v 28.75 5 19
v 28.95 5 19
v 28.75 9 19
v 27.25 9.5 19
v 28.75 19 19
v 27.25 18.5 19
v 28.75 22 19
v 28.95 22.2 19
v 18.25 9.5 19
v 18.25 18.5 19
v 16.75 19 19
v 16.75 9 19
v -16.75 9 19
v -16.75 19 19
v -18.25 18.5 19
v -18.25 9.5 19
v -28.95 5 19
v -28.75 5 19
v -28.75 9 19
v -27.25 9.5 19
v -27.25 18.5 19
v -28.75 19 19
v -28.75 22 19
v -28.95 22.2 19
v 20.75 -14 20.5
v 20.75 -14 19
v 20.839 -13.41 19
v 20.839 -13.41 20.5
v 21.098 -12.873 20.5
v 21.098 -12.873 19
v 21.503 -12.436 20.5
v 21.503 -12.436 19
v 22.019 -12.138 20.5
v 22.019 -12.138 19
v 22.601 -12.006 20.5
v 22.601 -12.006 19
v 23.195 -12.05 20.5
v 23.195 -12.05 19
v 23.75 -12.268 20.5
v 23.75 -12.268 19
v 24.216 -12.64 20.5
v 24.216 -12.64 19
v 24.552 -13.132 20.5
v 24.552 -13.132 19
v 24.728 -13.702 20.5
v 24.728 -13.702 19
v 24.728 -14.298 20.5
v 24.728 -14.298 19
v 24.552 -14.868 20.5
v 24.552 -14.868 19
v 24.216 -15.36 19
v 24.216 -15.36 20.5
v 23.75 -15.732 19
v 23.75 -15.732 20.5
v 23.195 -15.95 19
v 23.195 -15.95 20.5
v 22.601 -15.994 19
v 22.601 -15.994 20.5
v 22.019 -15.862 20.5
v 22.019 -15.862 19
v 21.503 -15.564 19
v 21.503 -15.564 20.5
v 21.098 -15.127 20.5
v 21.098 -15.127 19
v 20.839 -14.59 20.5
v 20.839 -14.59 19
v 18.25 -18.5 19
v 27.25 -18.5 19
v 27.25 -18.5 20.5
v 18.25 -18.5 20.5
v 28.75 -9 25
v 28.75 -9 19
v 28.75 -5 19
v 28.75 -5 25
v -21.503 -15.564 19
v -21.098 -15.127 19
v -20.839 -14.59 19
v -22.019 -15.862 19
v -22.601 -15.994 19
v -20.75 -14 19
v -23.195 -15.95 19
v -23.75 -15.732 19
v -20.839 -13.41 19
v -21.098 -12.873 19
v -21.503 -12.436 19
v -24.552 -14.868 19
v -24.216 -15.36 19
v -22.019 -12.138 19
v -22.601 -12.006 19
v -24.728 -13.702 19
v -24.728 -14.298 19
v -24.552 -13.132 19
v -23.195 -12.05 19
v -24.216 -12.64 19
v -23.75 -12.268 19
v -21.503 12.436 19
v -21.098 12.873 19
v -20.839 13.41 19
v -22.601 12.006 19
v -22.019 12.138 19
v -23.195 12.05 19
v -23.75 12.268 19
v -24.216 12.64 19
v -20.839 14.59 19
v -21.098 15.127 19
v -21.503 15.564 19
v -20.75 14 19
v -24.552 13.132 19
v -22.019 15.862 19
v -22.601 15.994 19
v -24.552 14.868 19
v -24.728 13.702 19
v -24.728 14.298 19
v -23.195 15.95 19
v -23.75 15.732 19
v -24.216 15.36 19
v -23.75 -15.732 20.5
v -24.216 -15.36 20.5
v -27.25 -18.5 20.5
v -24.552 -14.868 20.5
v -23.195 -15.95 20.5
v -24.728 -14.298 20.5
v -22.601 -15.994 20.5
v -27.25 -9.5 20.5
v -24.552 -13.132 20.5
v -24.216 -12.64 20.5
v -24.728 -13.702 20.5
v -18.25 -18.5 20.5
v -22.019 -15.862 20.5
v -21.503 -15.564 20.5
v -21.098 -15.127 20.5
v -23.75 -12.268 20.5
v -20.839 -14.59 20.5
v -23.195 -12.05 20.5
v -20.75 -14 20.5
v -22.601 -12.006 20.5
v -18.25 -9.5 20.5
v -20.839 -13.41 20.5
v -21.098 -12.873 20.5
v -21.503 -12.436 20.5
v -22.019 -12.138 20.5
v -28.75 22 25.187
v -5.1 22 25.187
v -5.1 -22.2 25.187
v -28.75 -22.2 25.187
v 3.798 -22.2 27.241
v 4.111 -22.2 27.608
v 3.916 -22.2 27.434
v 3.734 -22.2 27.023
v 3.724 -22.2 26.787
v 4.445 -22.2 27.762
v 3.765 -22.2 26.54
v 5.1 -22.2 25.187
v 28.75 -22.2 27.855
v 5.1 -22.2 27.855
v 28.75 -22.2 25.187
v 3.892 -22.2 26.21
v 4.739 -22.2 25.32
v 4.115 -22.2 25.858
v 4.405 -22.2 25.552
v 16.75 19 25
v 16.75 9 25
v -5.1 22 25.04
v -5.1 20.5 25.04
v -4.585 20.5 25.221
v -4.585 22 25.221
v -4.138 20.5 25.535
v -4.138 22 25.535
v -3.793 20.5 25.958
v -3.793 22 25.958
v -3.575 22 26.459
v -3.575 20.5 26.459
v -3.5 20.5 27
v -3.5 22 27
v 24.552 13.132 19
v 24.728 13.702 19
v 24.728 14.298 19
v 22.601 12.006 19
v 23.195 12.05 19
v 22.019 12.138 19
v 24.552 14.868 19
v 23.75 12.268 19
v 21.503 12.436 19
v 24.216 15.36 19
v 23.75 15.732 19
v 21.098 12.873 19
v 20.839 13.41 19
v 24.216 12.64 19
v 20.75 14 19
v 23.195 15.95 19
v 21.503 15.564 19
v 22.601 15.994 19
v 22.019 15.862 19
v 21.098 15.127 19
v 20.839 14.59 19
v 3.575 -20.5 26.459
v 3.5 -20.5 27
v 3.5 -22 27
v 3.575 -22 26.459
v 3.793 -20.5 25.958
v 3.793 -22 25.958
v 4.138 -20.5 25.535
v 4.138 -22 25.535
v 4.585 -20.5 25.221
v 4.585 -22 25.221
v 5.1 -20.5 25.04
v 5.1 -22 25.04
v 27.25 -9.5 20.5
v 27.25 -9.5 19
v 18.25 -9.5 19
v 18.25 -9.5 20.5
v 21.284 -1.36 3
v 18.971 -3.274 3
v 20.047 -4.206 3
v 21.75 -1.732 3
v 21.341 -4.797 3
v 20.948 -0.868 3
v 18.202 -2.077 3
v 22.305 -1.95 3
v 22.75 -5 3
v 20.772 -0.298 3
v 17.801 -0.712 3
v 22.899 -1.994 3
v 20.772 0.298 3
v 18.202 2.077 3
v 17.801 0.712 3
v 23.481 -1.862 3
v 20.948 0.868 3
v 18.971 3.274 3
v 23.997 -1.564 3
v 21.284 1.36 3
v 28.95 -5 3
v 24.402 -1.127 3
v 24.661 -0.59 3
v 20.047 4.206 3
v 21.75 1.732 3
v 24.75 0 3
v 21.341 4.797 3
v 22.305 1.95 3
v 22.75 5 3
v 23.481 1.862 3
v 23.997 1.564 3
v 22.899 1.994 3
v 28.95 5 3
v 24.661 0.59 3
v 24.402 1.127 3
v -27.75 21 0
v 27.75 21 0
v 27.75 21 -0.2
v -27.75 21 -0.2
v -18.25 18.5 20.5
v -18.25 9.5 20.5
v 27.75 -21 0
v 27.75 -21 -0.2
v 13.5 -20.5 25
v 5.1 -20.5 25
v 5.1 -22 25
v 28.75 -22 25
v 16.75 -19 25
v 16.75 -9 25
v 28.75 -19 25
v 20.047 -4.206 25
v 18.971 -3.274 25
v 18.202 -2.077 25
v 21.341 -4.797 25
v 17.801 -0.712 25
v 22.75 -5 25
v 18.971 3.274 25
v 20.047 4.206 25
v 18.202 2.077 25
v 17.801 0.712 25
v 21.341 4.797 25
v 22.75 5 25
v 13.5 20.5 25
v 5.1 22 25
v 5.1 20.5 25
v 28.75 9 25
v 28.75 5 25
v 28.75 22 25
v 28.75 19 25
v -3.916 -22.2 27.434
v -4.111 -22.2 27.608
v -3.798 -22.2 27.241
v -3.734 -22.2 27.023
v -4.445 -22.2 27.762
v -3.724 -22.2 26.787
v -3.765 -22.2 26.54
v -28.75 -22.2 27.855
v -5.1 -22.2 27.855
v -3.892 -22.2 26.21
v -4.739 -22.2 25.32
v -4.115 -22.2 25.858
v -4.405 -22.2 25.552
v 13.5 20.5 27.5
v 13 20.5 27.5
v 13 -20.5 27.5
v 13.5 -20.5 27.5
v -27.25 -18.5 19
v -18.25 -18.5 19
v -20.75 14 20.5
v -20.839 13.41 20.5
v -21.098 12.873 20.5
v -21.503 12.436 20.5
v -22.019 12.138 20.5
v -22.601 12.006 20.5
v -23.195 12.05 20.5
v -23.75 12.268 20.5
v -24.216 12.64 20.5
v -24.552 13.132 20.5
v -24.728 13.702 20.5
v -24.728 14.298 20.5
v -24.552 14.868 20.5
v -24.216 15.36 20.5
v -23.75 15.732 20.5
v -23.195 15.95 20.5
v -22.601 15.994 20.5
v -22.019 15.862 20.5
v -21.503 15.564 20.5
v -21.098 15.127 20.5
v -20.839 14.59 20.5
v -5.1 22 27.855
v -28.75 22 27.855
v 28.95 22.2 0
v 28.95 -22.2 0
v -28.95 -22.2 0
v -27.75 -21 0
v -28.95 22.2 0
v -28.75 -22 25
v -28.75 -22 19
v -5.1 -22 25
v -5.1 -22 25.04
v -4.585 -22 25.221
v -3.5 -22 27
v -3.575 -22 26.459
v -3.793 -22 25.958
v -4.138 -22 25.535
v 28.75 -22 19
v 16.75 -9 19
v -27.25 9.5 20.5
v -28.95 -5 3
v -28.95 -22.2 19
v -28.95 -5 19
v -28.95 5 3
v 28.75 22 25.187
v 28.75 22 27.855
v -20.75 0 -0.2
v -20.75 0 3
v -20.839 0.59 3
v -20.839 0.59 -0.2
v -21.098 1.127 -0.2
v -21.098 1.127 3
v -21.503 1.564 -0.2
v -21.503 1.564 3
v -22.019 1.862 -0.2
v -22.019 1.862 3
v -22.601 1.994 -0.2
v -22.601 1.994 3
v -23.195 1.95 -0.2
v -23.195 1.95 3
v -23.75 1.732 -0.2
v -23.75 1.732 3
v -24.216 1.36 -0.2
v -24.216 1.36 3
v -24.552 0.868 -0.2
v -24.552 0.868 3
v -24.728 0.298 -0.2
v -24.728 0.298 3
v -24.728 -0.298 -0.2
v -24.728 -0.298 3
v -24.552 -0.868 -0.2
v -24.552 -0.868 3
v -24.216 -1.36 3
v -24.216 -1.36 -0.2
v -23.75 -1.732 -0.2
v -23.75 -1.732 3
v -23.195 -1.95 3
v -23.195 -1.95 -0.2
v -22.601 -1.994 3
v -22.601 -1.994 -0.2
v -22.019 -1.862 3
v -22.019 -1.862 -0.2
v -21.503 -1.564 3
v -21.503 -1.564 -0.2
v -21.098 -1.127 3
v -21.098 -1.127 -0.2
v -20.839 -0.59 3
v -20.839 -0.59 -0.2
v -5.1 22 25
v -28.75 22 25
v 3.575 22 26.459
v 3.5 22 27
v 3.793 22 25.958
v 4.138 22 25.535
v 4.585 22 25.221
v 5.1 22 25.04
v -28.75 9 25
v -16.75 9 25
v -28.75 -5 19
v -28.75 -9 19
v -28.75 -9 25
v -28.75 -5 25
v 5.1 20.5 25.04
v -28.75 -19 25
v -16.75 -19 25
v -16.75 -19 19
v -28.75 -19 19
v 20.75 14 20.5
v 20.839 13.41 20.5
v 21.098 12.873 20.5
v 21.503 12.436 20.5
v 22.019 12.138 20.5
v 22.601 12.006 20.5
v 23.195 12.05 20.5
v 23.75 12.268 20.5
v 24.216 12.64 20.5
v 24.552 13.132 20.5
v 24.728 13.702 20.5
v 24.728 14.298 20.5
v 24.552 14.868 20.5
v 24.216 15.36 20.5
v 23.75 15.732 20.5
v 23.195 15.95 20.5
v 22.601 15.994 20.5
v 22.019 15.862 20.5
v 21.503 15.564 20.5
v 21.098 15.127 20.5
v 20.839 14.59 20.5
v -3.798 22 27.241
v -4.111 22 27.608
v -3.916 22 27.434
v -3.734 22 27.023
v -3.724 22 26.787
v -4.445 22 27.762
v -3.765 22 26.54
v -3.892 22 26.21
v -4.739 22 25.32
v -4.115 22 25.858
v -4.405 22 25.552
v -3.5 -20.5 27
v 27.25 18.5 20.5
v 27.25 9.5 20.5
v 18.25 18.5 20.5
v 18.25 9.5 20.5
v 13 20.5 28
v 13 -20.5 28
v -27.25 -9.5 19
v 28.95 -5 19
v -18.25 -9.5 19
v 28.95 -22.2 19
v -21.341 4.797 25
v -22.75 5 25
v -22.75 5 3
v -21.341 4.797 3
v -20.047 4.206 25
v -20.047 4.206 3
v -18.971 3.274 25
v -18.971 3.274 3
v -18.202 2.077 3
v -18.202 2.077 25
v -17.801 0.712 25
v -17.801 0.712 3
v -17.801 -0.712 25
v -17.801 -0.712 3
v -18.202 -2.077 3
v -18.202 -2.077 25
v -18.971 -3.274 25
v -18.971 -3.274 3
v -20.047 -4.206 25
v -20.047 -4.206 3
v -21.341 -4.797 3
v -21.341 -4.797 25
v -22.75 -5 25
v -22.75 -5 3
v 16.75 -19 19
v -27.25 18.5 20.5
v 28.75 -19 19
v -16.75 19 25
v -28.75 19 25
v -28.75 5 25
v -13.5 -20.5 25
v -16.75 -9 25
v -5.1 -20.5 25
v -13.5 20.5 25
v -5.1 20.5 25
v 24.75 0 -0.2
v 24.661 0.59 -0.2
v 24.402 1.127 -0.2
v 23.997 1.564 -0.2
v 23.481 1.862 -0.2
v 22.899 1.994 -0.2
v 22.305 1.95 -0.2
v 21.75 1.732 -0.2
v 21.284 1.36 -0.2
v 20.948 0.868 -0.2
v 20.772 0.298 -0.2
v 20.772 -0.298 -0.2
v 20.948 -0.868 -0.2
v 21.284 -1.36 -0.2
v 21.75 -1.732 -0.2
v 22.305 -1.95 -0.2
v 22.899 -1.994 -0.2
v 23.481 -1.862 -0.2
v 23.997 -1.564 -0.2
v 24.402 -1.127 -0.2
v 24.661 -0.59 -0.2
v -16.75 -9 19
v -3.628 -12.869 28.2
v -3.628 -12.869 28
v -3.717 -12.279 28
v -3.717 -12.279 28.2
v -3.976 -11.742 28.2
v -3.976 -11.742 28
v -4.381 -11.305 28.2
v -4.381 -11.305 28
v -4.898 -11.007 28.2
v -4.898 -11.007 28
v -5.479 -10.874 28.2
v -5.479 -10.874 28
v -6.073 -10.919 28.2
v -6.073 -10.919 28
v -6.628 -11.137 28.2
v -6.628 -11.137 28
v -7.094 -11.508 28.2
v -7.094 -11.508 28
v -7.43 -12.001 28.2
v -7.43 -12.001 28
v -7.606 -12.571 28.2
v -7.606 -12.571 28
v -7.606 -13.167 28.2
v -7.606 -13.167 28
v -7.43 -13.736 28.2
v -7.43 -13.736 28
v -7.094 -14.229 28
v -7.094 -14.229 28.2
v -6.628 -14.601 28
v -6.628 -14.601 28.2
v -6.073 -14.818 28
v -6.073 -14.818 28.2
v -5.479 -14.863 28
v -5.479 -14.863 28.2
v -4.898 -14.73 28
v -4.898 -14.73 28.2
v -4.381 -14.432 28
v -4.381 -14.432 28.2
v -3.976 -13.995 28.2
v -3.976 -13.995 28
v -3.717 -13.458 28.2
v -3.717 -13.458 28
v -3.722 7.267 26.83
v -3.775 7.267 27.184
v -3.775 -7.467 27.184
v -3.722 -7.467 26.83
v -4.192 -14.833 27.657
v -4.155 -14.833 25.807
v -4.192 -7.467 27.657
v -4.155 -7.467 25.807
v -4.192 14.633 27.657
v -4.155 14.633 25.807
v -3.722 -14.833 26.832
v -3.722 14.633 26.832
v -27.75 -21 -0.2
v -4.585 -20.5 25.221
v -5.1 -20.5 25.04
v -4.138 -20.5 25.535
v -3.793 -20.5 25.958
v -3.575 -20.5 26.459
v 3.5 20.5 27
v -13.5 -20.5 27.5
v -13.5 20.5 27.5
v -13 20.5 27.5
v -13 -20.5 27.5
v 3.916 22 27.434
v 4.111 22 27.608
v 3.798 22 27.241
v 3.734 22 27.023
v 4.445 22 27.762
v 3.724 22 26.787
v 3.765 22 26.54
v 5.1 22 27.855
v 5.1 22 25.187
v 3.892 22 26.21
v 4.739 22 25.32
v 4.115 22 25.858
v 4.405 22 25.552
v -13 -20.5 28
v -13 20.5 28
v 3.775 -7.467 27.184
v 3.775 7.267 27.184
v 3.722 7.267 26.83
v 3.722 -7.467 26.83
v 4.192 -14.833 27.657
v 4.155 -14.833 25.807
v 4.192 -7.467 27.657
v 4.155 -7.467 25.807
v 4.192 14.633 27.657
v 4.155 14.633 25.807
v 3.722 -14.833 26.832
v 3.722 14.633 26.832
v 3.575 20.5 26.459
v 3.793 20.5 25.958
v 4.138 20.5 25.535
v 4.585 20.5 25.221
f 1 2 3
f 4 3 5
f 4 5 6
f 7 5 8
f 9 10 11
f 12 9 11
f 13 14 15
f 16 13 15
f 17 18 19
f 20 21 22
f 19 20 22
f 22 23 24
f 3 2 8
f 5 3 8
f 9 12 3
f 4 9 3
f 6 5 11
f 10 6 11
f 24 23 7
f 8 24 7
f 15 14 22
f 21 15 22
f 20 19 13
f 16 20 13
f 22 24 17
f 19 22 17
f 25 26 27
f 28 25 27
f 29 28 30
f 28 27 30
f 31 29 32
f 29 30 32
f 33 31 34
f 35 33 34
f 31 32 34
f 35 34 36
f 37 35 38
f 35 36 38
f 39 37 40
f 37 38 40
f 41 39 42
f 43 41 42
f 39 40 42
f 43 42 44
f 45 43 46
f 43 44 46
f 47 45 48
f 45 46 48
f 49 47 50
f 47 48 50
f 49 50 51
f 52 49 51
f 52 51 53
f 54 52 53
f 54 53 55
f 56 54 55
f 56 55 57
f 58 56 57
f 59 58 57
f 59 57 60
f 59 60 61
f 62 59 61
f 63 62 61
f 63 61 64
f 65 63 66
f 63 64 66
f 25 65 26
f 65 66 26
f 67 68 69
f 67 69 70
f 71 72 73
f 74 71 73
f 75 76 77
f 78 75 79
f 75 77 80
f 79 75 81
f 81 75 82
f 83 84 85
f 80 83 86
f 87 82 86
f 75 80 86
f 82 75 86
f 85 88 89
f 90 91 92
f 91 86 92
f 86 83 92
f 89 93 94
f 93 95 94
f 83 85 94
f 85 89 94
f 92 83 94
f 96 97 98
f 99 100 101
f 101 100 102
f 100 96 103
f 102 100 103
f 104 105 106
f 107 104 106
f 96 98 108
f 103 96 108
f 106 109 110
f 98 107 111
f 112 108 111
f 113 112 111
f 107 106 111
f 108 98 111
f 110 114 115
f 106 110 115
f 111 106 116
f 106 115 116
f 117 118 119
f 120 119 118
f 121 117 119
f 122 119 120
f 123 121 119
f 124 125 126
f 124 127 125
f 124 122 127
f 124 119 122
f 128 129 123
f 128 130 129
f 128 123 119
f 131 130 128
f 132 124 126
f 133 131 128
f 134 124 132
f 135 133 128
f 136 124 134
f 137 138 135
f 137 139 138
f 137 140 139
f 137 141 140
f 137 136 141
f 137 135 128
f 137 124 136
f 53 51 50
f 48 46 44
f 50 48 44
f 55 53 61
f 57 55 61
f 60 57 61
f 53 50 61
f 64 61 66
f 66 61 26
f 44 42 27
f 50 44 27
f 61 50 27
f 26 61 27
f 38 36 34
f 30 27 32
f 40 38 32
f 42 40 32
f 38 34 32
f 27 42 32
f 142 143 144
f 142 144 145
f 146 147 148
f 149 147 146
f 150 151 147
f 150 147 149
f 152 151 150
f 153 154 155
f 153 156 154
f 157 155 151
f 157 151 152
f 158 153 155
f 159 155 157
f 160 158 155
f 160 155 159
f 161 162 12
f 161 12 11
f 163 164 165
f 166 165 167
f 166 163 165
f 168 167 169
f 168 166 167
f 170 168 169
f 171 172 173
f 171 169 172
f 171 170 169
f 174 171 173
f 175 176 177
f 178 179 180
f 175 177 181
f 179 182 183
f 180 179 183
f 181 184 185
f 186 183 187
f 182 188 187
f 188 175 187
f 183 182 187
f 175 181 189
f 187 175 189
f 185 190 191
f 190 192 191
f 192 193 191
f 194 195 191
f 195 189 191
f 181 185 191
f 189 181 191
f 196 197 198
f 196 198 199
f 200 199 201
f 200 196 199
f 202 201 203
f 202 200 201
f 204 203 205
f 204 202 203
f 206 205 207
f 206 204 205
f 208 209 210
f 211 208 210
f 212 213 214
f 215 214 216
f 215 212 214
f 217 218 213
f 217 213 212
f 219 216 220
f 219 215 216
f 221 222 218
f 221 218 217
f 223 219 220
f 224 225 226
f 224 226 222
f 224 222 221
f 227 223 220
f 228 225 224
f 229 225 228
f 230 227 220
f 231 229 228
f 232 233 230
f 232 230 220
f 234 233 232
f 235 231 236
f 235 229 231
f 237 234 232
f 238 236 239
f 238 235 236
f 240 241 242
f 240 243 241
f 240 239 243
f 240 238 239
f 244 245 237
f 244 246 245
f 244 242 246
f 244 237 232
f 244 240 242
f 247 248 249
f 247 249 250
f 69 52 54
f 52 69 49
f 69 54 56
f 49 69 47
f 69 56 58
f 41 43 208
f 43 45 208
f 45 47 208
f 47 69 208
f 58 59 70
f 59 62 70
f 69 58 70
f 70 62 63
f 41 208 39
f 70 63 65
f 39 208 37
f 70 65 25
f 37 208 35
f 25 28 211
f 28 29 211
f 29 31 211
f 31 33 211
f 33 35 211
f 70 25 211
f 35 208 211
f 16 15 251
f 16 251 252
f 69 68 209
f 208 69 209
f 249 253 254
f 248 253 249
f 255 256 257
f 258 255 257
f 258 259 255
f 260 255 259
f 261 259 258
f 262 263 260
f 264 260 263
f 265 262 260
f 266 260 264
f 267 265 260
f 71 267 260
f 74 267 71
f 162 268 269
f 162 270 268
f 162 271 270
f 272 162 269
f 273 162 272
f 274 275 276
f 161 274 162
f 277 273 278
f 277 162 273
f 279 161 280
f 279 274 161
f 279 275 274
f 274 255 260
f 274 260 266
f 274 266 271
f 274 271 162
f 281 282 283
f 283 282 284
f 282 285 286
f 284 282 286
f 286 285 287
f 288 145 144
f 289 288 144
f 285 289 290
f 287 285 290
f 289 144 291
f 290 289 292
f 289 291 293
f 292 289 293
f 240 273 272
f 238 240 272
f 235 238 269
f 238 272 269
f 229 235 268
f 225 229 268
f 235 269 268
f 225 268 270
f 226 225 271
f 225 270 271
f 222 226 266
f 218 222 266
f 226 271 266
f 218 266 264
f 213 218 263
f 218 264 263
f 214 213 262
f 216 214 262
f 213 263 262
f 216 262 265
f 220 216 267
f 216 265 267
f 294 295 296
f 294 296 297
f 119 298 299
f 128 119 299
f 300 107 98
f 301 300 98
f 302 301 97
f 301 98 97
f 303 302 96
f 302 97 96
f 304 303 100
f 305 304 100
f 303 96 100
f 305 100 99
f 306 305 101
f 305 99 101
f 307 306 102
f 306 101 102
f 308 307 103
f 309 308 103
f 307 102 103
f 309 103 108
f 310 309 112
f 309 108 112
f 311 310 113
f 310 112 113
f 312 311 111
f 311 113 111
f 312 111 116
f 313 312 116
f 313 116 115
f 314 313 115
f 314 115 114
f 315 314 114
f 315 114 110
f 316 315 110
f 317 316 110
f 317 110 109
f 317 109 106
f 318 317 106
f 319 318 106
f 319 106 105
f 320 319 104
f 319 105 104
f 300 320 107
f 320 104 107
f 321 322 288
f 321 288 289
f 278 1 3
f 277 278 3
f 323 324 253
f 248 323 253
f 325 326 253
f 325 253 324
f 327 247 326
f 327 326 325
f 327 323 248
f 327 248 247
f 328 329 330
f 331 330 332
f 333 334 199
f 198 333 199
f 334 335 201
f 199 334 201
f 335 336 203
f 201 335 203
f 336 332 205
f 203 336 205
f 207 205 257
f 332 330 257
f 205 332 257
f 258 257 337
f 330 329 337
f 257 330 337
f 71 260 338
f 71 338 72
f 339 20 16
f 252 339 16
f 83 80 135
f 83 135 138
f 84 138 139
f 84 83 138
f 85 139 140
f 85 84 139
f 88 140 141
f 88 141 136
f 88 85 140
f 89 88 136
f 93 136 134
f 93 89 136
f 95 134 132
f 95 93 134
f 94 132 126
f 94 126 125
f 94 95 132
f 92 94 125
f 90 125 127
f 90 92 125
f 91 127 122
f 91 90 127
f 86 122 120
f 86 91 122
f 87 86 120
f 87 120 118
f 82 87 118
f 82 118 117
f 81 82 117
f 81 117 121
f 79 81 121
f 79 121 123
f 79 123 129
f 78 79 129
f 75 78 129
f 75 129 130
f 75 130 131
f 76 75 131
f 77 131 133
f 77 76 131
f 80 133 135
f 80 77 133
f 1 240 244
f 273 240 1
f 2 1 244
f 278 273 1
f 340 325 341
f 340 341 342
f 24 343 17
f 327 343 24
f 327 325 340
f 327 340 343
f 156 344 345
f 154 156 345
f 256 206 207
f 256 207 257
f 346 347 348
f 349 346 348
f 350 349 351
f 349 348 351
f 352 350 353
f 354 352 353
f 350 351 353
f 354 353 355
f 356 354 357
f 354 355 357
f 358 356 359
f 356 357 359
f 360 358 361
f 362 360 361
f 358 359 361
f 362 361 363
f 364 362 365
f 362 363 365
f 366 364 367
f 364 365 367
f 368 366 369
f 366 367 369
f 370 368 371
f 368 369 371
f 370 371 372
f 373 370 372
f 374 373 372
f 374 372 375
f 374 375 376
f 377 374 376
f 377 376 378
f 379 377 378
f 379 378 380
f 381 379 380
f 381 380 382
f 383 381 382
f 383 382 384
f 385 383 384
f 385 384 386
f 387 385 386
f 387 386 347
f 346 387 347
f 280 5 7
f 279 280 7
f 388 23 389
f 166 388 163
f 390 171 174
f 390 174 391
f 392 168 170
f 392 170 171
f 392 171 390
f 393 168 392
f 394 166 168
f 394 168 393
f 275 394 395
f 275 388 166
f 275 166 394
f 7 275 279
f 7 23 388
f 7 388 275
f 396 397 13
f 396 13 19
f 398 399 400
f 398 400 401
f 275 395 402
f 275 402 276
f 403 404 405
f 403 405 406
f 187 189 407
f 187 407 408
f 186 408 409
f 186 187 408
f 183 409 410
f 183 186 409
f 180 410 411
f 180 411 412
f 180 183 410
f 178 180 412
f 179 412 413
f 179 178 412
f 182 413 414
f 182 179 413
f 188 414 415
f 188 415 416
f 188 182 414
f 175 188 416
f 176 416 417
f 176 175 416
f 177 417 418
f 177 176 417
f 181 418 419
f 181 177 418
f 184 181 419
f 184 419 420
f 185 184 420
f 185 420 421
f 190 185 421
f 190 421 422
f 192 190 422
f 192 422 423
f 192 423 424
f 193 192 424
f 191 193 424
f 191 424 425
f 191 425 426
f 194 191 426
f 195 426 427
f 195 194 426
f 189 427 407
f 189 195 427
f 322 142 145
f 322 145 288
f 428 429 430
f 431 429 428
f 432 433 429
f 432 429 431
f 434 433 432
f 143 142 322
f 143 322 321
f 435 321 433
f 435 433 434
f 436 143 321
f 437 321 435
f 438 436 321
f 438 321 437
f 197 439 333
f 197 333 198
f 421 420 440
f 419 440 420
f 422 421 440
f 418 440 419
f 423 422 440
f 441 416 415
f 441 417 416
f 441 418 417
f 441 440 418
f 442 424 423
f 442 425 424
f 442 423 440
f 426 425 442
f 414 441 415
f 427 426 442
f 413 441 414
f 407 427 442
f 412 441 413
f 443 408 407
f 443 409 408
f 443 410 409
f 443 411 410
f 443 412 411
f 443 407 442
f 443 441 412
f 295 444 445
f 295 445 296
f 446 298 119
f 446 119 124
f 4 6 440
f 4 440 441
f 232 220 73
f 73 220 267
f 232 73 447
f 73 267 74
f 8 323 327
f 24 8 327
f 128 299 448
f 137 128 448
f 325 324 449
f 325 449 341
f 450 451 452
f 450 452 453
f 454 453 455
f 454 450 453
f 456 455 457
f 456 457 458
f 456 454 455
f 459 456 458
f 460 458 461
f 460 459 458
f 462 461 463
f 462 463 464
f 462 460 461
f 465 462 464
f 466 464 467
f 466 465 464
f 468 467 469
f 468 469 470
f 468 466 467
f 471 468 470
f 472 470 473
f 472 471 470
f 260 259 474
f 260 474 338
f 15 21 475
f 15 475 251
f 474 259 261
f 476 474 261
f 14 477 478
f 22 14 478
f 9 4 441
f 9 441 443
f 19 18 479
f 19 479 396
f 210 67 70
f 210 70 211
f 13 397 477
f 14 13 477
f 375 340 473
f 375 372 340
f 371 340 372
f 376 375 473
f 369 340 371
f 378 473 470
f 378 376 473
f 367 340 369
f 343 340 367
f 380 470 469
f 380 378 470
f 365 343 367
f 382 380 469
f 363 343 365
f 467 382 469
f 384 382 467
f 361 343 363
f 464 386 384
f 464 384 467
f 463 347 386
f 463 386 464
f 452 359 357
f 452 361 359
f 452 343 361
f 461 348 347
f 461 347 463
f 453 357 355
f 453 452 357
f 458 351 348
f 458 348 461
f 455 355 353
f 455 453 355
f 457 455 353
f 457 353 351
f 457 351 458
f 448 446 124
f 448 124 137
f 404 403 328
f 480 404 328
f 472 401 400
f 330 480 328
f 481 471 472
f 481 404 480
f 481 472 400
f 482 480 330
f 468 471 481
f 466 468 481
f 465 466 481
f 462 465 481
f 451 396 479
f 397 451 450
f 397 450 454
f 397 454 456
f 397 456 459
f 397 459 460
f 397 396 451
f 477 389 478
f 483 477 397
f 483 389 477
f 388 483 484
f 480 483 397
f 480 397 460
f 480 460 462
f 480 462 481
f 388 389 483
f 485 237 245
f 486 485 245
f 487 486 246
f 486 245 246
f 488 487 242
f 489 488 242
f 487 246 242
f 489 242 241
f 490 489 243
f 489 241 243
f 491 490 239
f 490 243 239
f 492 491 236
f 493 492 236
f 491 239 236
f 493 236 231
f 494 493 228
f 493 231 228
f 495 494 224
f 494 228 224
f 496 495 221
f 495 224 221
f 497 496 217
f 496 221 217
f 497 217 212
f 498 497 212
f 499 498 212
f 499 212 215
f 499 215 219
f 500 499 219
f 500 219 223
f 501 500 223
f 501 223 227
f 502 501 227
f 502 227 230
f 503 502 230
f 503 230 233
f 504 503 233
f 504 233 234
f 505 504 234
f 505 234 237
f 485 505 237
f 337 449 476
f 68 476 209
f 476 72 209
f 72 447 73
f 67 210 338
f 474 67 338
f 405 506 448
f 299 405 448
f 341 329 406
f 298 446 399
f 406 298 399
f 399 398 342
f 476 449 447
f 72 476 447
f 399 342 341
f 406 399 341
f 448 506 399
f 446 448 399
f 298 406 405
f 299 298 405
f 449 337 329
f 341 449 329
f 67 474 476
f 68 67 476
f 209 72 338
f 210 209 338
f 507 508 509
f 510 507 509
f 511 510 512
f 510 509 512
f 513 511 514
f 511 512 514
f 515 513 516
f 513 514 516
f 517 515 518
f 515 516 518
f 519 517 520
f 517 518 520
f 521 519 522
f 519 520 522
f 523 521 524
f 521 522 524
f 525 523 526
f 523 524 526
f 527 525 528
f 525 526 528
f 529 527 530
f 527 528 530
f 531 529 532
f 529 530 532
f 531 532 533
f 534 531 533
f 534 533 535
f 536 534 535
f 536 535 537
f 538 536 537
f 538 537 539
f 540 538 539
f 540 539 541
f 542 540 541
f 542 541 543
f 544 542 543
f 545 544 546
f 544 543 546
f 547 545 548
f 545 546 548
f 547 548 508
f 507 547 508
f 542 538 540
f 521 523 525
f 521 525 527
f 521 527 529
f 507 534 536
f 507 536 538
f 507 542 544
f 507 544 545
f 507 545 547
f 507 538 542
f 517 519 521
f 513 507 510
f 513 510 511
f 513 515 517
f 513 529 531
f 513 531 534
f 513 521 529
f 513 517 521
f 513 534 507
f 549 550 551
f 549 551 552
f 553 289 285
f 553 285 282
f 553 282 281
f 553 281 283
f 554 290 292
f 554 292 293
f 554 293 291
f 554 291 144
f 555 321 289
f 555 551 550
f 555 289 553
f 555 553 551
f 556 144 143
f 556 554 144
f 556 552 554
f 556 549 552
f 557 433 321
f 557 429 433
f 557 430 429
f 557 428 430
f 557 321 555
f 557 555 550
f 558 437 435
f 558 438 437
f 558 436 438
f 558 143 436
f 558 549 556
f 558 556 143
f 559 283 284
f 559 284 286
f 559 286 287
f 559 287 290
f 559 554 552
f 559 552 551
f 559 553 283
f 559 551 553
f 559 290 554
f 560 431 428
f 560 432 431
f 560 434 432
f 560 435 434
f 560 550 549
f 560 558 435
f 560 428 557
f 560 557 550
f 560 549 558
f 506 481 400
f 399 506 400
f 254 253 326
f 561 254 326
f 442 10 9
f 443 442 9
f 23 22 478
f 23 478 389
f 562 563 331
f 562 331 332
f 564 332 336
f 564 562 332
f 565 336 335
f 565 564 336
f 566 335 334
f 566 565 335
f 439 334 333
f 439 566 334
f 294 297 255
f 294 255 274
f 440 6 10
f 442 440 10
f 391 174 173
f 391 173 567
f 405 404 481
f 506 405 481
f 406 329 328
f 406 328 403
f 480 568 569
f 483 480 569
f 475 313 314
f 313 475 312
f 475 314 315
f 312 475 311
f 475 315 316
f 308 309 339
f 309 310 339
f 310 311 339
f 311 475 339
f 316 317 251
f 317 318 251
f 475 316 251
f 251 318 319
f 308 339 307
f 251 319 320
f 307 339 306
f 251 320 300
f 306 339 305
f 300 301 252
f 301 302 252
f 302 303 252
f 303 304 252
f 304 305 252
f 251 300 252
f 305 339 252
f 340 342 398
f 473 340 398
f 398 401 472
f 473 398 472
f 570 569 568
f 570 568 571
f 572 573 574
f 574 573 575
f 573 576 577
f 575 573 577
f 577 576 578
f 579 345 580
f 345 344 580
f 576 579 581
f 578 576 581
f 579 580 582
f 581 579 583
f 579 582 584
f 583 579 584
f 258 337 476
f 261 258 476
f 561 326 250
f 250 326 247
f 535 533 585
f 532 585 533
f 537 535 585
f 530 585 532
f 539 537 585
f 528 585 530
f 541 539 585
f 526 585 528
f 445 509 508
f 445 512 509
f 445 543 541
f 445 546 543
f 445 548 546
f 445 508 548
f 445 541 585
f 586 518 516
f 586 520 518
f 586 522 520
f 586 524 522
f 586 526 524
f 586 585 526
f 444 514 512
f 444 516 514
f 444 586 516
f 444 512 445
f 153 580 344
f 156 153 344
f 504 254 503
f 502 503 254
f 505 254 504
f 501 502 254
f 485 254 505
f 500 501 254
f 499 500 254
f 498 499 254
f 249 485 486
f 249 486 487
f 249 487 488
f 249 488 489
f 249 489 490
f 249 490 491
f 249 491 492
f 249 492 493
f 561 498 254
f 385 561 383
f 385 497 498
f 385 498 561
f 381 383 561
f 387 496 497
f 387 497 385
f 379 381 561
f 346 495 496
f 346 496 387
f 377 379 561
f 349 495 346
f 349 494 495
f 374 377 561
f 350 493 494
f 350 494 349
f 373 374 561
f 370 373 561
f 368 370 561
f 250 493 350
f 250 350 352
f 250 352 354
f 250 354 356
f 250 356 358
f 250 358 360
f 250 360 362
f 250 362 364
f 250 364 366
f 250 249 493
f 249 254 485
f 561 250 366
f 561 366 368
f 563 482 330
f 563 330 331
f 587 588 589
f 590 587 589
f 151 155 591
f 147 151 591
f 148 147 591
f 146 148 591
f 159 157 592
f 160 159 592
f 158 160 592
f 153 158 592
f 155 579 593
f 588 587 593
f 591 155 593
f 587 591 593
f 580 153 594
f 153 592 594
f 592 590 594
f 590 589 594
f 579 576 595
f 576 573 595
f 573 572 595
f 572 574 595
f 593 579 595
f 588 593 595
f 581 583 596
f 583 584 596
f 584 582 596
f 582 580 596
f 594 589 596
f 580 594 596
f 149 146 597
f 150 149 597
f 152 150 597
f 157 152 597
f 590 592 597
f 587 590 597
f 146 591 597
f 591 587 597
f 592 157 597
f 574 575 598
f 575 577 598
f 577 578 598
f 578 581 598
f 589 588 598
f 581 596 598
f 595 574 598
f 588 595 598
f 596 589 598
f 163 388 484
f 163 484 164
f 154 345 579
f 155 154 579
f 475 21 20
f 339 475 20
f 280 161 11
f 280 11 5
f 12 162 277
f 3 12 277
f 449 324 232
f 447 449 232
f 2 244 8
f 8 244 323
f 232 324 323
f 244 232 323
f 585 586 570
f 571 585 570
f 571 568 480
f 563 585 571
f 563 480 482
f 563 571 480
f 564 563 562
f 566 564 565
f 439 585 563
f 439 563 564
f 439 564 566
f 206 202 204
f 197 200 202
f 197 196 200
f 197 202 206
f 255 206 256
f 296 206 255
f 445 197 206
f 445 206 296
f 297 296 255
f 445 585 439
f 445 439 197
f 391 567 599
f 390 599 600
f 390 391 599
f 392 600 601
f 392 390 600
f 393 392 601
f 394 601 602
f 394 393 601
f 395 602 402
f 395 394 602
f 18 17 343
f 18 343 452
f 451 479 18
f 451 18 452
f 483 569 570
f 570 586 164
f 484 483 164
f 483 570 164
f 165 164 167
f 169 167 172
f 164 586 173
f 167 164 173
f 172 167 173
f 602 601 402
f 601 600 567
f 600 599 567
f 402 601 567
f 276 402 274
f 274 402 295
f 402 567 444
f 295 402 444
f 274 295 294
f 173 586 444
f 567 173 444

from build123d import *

# Parameters (mm, degrees)
SKETCH1_W               = 57.5
SKETCH1_H               = 44
BOSS_EXTRUDE1_DEPTH     = 28
SKETCH2_W               = 57.5
SKETCH2_H               = 44
SKETCH2_W_2             = 27
SKETCH2_H_2             = 41
CUT_EXTRUDE1_DEPTH      = 3
SKETCH3_W               = 10.2
SKETCH3_H               = 1.730752257
BOSS_EXTRUDE2_DEPTH     = 44
SKETCH4_W               = 0.5
SKETCH4_H               = 0.5
CUT_EXTRUDE2_DEPTH      = 59.453507166
SKETCH5_W               = 12
SKETCH5_H               = 10
CUT_EXTRUDE3_DEPTH      = 6
CUT_EXTRUDE4_DEPTH      = 22
SKETCH8_R               = 2
BOSS_EXTRUDE3_DEPTH     = 0.2
SKETCH9_W               = 55.5
SKETCH9_H               = 42
BOSS_EXTRUDE4_DEPTH     = 0.2
SKETCH7_R               = 2
CUT_EXTRUDE5_DEPTH      = 22
SKETCH10_W              = 57.9
SKETCH10_H              = 44.4
SKETCH10_W_2            = 57.5
SKETCH10_H_2            = 44
BOSS_EXTRUDE5_DEPTH     = 19
SKETCH11_W              = 2.584328925
SKETCH11_H              = 10
SKETCH11_W_2            = 1.649136063
CUT_EXTRUDE6_DEPTH      = 22
SKETCH12_W              = 9
SKETCH12_H              = 9
SKETCH12_R              = 2
BOSS_EXTRUDE6_DEPTH     = 1.5
MIRROR3_COPY_1_SKETCH_W = 9
MIRROR3_COPY_1_SKETCH_H = 9
MIRROR3_COPY_1_SKETCH_R = 2
MIRROR3_COPY_1_DEPTH    = 1.5
BOSS_EXTRUDE7_DEPTH     = 44.2
BOSS_EXTRUDE7_2_DEPTH   = 44.2


with BuildPart() as part:
    # Sketch1 → Boss-Extrude1 (new body)
    with BuildSketch(Plane.XY):
        Rectangle(SKETCH1_W, SKETCH1_H)
    extrude(amount=BOSS_EXTRUDE1_DEPTH)

    # Sketch2 → Cut-Extrude1 (cut)
    with BuildSketch(Plane.XY.offset(28)):
        Rectangle(SKETCH2_W, SKETCH2_H)
        Rectangle(SKETCH2_W_2, SKETCH2_H_2, mode=Mode.SUBTRACT)
    extrude(amount=-CUT_EXTRUDE1_DEPTH, mode=Mode.SUBTRACT)

    # Sketch3 → Boss-Extrude2 (add, through all)
    with BuildSketch(Plane(origin=(0, 22, 0), x_dir=(1, 0, 0), z_dir=(0, 1, 0))):
        with BuildLine():
            Line((-3.5, -26.999540764), (3.5, -26.999540764))
            ThreePointArc((3.5, -26.999540764), (3.950806662, -25.7346297), (5.1, -25.039948969))
            Line((5.1, -25.039948969), (5.1, -25))
            Line((5.1, -25), (-5.1, -25))
            Line((-5.1, -25), (-5.1, -25.039948969))
            ThreePointArc((-5.1, -25.039948969), (-3.950806662, -25.7346297), (-3.5, -26.999540764))
        make_face()
        with Locations((0, -24.134623872)):
            Rectangle(SKETCH3_W, SKETCH3_H)
    extrude(amount=-BOSS_EXTRUDE2_DEPTH)

    # Sketch4 → Cut-Extrude2 (cut, through all)
    with BuildSketch(Plane(origin=(0, 20.5, 0), x_dir=(1, 0, 0), z_dir=(0, 1, 0))):
        with Locations((13.25, -27.75)):
            Rectangle(SKETCH4_W, SKETCH4_H)
        with Locations((-13.25, -27.75)):
            Rectangle(SKETCH4_W, SKETCH4_H)
    extrude(amount=-CUT_EXTRUDE2_DEPTH, mode=Mode.SUBTRACT)

    # Sketch5 → Cut-Extrude3 (cut)
    with BuildSketch(Plane.XY.offset(25)):
        with Locations((22.75, -14)):
            Rectangle(SKETCH5_W, SKETCH5_H)
        with Locations((22.75, 14)):
            Rectangle(SKETCH5_W, SKETCH5_H)
    cut_extrude3 = extrude(amount=-CUT_EXTRUDE3_DEPTH, mode=Mode.SUBTRACT)

    # Sketch6 → Cut-Extrude4 (cut)
    with BuildSketch(Plane.XY.offset(25)):
        with BuildLine():
            Line((22.75, -5), (28.75, -5))
            Line((28.75, -5), (28.75, 5))
            Line((28.75, 5), (22.75, 5))
            ThreePointArc((22.75, 5), (26.285533906, 3.535533906), (27.75, 0))
            ThreePointArc((27.75, 0), (26.285533906, -3.535533906), (22.75, -5))
        make_face()
        with BuildLine():
            ThreePointArc((22.75, 5), (17.75, 0), (22.75, -5))
            Line((22.75, -5), (22.75, 5))
        make_face()
        with BuildLine():
            Line((22.75, 5), (22.75, -5))
            ThreePointArc((22.75, -5), (26.285533906, -3.535533906), (27.75, 0))
            ThreePointArc((27.75, 0), (26.285533906, 3.535533906), (22.75, 5))
        make_face()
        with BuildLine():
            ThreePointArc((22.75, 5), (17.75, 0), (22.75, -5))
            Line((22.75, -5), (22.75, 5))
        make_face()
        with BuildLine():
            Line((22.75, 5), (22.75, -5))
            ThreePointArc((22.75, -5), (26.285533906, -3.535533906), (27.75, 0))
            ThreePointArc((27.75, 0), (26.285533906, 3.535533906), (22.75, 5))
        make_face()
    cut_extrude4 = extrude(amount=-CUT_EXTRUDE4_DEPTH, mode=Mode.SUBTRACT)

    # Mirror1: Cut-Extrude3, Cut-Extrude4 across plane
    add(cut_extrude3.mirror(Plane(origin=(0, 0, 0), x_dir=(0, 0, 1), z_dir=(1, 0, 0))), mode=Mode.SUBTRACT)
    add(cut_extrude4.mirror(Plane(origin=(0, 0, 0), x_dir=(0, 0, 1), z_dir=(1, 0, 0))), mode=Mode.SUBTRACT)

    # Sketch8 → Boss-Extrude3 (add)
    with BuildSketch(Plane.XY.offset(28)):
        with Locations((-5.62819331, -12.868629494)):
            Circle(SKETCH8_R)
    extrude(amount=BOSS_EXTRUDE3_DEPTH)

    # Sketch9 → Boss-Extrude4 (add)
    with BuildSketch(Plane(origin=(0, 0, 0), x_dir=(-1, 0, 0), z_dir=(0, 0, -1))):
        Rectangle(SKETCH9_W, SKETCH9_H)
    extrude(amount=BOSS_EXTRUDE4_DEPTH)

    # Sketch7 → Cut-Extrude5 (cut)
    with BuildSketch(Plane.XY.offset(3)):
        with Locations((22.75, 0)):
            Circle(SKETCH7_R)
        with Locations((-22.75, 0)):
            Circle(SKETCH7_R)
    extrude(amount=-CUT_EXTRUDE5_DEPTH, mode=Mode.SUBTRACT)

    # Sketch10 → Boss-Extrude5 (add)
    with BuildSketch(Plane(origin=(0, 0, 0), x_dir=(-1, 0, 0), z_dir=(0, 0, -1))):
        Rectangle(SKETCH10_W, SKETCH10_H)
        Rectangle(SKETCH10_W_2, SKETCH10_H_2, mode=Mode.SUBTRACT)
    extrude(amount=-BOSS_EXTRUDE5_DEPTH)

    # Sketch11 → Cut-Extrude6 (cut)
    with BuildSketch(Plane.XY.offset(25)):
        with Locations((-30.042164463, 0)):
            Rectangle(SKETCH11_W, SKETCH11_H)
        with Locations((29.574568032, 0)):
            Rectangle(SKETCH11_W_2, SKETCH11_H)
    extrude(amount=-CUT_EXTRUDE6_DEPTH, mode=Mode.SUBTRACT)

    # Sketch12 → Boss-Extrude6 (add)
    with BuildSketch(Plane.XY.offset(19)):
        with Locations((-22.75, -14)):
            Rectangle(SKETCH12_W, SKETCH12_H)
        with Locations((-22.75, -14)):
            Circle(SKETCH12_R, mode=Mode.SUBTRACT)
    boss_extrude6 = extrude(amount=BOSS_EXTRUDE6_DEPTH)

    # Mirror2: Boss-Extrude6 across plane
    add(boss_extrude6.mirror(Plane.ZX))

    # Mirror3: Boss-Extrude6 across plane
    add(boss_extrude6.mirror(Plane(origin=(0, 0, 0), x_dir=(0, 0, 1), z_dir=(1, 0, 0))))

    # Mirror3 copy 1 sketch → Mirror3 copy 1 (add)
    with BuildSketch(Plane(origin=(0, 0, 19), x_dir=(-1, 0, 0), z_dir=(0, 0, 1))):
        with Locations((-22.75, -14)):
            Rectangle(MIRROR3_COPY_1_SKETCH_W, MIRROR3_COPY_1_SKETCH_H)
        with Locations((-22.75, -14)):
            Circle(MIRROR3_COPY_1_SKETCH_R, mode=Mode.SUBTRACT)
    extrude(amount=MIRROR3_COPY_1_DEPTH)


with BuildPart() as body_2:
    # Sketch14 → Boss-Extrude7 (new, through all)
    with BuildSketch(Plane(origin=(0, 22, 0), x_dir=(1, 0, 0), z_dir=(0, 1, 0))):
        with BuildLine():
            Line((-5.1, -25.186992194), (-28.75, -25.186992194))
            Line((-28.75, -25.186992194), (-28.75, -27.855473738))
            Line((-28.75, -27.855473738), (-5.1, -27.855473738))
            add(Edge.make_bspline(
                [(-5.1, -27.855473738), (-4.309245216, -27.837222897), (-3.79867042, -27.493257099), (-3.620504351, -26.29875873), (-4.399923319, -25.331121248), (-5.1, -25.186992194)],
                knots=[0, 0, 0, 0, 0.351045262, 0.451045262, 1, 1, 1, 1], degree=3))
        make_face()
    extrude(amount=-BOSS_EXTRUDE7_DEPTH)


with BuildPart() as body_3:
    # Sketch14 → Boss-Extrude7 2 (new, through all)
    with BuildSketch(Plane(origin=(0, 22, 0), x_dir=(1, 0, 0), z_dir=(0, 1, 0))):
        with BuildLine():
            Line((28.75, -27.855473738), (5.1, -27.855473738))
            add(Edge.make_bspline(
                [(5.1, -27.855473738), (4.309245216, -27.837222897), (3.79867042, -27.493257099), (3.620504351, -26.29875873), (4.399923319, -25.331121248), (5.1, -25.186992194)],
                knots=[0, 0, 0, 0, 0.351045262, 0.451045262, 1, 1, 1, 1], degree=3))
            Line((5.1, -25.186992194), (28.75, -25.186992194))
            Line((28.75, -25.186992194), (28.75, -27.855473738))
        make_face()
    extrude(amount=-BOSS_EXTRUDE7_2_DEPTH)


solid = Compound([part.part, body_2.part, body_3.part])
